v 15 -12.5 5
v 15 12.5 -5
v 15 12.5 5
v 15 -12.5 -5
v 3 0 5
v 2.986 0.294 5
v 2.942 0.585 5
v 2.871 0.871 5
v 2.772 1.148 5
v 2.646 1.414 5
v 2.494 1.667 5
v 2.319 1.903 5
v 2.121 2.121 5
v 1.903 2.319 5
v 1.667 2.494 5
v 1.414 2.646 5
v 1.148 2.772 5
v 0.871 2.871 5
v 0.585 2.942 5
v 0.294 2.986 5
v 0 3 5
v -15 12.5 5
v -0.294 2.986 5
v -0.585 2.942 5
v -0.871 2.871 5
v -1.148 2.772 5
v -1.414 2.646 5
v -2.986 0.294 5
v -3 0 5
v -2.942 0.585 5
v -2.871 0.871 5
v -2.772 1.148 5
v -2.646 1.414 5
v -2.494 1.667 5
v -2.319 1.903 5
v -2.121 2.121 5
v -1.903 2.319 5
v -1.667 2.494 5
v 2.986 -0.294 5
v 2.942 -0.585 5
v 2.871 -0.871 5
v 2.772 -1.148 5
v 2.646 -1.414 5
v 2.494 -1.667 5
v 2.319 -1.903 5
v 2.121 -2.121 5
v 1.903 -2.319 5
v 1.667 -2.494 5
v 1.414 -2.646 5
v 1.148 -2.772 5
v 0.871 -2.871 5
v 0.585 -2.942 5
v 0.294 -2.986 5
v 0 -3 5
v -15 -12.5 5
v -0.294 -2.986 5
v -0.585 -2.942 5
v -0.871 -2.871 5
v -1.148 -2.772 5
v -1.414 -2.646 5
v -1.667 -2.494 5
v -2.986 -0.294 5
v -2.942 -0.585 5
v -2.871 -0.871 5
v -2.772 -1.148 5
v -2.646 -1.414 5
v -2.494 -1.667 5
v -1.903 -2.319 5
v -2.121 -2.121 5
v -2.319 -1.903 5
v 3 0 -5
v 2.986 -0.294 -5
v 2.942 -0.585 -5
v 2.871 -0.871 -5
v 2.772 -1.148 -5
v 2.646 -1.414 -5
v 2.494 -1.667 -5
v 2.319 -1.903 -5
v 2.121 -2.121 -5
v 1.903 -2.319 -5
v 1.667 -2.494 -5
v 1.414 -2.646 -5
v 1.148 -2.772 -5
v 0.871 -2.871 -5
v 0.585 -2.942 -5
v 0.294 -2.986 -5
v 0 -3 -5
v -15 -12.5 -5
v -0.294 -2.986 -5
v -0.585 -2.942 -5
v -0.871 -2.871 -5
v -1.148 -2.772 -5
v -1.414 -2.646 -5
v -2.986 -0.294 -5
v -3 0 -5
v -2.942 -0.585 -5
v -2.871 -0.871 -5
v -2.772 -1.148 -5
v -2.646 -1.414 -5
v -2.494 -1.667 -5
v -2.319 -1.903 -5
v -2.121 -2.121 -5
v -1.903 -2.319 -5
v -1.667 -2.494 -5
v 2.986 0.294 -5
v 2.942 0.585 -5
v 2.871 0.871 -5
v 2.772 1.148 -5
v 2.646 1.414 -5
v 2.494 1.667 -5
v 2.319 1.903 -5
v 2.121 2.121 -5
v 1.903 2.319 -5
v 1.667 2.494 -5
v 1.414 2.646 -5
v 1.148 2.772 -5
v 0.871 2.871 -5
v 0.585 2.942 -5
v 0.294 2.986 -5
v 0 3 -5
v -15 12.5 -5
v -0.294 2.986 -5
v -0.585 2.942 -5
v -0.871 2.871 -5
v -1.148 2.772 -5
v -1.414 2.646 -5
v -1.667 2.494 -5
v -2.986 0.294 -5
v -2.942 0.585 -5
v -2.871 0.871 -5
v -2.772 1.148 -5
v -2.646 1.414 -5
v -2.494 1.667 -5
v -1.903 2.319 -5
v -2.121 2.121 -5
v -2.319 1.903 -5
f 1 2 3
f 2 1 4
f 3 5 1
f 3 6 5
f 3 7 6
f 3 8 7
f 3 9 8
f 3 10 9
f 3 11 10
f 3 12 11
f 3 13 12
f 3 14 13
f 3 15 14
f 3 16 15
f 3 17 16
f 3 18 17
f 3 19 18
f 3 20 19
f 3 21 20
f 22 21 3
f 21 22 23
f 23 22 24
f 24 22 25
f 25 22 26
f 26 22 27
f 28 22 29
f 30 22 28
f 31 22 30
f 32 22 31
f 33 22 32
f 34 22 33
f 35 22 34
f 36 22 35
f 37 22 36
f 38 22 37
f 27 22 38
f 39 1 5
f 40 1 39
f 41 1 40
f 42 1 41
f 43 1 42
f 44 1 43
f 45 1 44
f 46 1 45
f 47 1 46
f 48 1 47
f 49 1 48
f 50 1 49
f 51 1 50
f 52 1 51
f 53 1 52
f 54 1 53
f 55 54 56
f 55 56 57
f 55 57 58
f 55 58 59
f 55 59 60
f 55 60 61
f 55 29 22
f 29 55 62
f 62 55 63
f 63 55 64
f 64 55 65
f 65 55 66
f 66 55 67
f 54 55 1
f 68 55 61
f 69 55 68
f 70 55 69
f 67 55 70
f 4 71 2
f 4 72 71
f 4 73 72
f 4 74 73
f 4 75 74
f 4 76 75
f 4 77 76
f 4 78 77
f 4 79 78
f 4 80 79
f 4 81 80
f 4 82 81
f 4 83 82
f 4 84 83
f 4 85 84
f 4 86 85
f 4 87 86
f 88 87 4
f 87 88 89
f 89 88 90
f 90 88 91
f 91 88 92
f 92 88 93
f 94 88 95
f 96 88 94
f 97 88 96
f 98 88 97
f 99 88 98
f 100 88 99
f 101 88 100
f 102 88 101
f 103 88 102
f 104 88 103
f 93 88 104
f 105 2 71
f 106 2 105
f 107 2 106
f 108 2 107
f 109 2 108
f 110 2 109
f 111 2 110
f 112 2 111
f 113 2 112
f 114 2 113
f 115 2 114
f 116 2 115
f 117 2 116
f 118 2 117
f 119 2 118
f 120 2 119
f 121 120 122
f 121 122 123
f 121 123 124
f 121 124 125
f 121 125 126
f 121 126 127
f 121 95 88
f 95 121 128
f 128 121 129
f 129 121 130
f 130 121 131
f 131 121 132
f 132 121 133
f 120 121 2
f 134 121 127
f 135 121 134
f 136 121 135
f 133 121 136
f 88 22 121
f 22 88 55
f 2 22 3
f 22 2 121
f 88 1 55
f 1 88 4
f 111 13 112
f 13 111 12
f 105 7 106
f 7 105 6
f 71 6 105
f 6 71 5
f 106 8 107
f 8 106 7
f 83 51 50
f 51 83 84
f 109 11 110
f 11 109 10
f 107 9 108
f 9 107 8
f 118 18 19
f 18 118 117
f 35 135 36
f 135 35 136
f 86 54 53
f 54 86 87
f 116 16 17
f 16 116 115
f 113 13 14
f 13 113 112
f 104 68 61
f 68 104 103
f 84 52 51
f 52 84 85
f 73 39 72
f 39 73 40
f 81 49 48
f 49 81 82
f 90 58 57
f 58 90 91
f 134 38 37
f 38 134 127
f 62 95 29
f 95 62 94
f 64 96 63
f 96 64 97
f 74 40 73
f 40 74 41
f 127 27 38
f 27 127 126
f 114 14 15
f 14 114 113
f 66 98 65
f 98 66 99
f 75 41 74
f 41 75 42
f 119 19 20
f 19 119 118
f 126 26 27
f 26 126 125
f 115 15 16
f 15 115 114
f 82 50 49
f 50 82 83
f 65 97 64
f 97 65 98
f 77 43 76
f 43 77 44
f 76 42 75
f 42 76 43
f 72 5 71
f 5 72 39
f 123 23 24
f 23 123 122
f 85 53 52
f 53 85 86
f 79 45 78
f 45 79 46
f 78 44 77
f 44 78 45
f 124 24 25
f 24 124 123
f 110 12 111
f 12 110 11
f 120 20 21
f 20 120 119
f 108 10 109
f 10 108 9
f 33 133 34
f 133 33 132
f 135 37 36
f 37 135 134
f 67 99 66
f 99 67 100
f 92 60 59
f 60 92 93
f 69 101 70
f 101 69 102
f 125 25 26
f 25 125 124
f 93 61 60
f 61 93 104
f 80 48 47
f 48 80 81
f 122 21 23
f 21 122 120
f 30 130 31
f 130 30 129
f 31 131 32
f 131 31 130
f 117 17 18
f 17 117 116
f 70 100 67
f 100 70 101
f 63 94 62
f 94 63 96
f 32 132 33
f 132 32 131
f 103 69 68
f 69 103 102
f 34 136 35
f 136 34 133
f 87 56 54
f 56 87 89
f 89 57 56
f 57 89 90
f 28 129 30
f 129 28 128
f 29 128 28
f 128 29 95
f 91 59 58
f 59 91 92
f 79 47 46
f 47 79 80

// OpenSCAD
module linear_bearing_block() {
    difference() {
        // Main block
        cube([30, 25, 10], center = true);
        
        // Shaft hole
        translate([0, 0, -5])
            cylinder(h = 20, d = 6, $fn = 64);
    }
}

linear_bearing_block();
